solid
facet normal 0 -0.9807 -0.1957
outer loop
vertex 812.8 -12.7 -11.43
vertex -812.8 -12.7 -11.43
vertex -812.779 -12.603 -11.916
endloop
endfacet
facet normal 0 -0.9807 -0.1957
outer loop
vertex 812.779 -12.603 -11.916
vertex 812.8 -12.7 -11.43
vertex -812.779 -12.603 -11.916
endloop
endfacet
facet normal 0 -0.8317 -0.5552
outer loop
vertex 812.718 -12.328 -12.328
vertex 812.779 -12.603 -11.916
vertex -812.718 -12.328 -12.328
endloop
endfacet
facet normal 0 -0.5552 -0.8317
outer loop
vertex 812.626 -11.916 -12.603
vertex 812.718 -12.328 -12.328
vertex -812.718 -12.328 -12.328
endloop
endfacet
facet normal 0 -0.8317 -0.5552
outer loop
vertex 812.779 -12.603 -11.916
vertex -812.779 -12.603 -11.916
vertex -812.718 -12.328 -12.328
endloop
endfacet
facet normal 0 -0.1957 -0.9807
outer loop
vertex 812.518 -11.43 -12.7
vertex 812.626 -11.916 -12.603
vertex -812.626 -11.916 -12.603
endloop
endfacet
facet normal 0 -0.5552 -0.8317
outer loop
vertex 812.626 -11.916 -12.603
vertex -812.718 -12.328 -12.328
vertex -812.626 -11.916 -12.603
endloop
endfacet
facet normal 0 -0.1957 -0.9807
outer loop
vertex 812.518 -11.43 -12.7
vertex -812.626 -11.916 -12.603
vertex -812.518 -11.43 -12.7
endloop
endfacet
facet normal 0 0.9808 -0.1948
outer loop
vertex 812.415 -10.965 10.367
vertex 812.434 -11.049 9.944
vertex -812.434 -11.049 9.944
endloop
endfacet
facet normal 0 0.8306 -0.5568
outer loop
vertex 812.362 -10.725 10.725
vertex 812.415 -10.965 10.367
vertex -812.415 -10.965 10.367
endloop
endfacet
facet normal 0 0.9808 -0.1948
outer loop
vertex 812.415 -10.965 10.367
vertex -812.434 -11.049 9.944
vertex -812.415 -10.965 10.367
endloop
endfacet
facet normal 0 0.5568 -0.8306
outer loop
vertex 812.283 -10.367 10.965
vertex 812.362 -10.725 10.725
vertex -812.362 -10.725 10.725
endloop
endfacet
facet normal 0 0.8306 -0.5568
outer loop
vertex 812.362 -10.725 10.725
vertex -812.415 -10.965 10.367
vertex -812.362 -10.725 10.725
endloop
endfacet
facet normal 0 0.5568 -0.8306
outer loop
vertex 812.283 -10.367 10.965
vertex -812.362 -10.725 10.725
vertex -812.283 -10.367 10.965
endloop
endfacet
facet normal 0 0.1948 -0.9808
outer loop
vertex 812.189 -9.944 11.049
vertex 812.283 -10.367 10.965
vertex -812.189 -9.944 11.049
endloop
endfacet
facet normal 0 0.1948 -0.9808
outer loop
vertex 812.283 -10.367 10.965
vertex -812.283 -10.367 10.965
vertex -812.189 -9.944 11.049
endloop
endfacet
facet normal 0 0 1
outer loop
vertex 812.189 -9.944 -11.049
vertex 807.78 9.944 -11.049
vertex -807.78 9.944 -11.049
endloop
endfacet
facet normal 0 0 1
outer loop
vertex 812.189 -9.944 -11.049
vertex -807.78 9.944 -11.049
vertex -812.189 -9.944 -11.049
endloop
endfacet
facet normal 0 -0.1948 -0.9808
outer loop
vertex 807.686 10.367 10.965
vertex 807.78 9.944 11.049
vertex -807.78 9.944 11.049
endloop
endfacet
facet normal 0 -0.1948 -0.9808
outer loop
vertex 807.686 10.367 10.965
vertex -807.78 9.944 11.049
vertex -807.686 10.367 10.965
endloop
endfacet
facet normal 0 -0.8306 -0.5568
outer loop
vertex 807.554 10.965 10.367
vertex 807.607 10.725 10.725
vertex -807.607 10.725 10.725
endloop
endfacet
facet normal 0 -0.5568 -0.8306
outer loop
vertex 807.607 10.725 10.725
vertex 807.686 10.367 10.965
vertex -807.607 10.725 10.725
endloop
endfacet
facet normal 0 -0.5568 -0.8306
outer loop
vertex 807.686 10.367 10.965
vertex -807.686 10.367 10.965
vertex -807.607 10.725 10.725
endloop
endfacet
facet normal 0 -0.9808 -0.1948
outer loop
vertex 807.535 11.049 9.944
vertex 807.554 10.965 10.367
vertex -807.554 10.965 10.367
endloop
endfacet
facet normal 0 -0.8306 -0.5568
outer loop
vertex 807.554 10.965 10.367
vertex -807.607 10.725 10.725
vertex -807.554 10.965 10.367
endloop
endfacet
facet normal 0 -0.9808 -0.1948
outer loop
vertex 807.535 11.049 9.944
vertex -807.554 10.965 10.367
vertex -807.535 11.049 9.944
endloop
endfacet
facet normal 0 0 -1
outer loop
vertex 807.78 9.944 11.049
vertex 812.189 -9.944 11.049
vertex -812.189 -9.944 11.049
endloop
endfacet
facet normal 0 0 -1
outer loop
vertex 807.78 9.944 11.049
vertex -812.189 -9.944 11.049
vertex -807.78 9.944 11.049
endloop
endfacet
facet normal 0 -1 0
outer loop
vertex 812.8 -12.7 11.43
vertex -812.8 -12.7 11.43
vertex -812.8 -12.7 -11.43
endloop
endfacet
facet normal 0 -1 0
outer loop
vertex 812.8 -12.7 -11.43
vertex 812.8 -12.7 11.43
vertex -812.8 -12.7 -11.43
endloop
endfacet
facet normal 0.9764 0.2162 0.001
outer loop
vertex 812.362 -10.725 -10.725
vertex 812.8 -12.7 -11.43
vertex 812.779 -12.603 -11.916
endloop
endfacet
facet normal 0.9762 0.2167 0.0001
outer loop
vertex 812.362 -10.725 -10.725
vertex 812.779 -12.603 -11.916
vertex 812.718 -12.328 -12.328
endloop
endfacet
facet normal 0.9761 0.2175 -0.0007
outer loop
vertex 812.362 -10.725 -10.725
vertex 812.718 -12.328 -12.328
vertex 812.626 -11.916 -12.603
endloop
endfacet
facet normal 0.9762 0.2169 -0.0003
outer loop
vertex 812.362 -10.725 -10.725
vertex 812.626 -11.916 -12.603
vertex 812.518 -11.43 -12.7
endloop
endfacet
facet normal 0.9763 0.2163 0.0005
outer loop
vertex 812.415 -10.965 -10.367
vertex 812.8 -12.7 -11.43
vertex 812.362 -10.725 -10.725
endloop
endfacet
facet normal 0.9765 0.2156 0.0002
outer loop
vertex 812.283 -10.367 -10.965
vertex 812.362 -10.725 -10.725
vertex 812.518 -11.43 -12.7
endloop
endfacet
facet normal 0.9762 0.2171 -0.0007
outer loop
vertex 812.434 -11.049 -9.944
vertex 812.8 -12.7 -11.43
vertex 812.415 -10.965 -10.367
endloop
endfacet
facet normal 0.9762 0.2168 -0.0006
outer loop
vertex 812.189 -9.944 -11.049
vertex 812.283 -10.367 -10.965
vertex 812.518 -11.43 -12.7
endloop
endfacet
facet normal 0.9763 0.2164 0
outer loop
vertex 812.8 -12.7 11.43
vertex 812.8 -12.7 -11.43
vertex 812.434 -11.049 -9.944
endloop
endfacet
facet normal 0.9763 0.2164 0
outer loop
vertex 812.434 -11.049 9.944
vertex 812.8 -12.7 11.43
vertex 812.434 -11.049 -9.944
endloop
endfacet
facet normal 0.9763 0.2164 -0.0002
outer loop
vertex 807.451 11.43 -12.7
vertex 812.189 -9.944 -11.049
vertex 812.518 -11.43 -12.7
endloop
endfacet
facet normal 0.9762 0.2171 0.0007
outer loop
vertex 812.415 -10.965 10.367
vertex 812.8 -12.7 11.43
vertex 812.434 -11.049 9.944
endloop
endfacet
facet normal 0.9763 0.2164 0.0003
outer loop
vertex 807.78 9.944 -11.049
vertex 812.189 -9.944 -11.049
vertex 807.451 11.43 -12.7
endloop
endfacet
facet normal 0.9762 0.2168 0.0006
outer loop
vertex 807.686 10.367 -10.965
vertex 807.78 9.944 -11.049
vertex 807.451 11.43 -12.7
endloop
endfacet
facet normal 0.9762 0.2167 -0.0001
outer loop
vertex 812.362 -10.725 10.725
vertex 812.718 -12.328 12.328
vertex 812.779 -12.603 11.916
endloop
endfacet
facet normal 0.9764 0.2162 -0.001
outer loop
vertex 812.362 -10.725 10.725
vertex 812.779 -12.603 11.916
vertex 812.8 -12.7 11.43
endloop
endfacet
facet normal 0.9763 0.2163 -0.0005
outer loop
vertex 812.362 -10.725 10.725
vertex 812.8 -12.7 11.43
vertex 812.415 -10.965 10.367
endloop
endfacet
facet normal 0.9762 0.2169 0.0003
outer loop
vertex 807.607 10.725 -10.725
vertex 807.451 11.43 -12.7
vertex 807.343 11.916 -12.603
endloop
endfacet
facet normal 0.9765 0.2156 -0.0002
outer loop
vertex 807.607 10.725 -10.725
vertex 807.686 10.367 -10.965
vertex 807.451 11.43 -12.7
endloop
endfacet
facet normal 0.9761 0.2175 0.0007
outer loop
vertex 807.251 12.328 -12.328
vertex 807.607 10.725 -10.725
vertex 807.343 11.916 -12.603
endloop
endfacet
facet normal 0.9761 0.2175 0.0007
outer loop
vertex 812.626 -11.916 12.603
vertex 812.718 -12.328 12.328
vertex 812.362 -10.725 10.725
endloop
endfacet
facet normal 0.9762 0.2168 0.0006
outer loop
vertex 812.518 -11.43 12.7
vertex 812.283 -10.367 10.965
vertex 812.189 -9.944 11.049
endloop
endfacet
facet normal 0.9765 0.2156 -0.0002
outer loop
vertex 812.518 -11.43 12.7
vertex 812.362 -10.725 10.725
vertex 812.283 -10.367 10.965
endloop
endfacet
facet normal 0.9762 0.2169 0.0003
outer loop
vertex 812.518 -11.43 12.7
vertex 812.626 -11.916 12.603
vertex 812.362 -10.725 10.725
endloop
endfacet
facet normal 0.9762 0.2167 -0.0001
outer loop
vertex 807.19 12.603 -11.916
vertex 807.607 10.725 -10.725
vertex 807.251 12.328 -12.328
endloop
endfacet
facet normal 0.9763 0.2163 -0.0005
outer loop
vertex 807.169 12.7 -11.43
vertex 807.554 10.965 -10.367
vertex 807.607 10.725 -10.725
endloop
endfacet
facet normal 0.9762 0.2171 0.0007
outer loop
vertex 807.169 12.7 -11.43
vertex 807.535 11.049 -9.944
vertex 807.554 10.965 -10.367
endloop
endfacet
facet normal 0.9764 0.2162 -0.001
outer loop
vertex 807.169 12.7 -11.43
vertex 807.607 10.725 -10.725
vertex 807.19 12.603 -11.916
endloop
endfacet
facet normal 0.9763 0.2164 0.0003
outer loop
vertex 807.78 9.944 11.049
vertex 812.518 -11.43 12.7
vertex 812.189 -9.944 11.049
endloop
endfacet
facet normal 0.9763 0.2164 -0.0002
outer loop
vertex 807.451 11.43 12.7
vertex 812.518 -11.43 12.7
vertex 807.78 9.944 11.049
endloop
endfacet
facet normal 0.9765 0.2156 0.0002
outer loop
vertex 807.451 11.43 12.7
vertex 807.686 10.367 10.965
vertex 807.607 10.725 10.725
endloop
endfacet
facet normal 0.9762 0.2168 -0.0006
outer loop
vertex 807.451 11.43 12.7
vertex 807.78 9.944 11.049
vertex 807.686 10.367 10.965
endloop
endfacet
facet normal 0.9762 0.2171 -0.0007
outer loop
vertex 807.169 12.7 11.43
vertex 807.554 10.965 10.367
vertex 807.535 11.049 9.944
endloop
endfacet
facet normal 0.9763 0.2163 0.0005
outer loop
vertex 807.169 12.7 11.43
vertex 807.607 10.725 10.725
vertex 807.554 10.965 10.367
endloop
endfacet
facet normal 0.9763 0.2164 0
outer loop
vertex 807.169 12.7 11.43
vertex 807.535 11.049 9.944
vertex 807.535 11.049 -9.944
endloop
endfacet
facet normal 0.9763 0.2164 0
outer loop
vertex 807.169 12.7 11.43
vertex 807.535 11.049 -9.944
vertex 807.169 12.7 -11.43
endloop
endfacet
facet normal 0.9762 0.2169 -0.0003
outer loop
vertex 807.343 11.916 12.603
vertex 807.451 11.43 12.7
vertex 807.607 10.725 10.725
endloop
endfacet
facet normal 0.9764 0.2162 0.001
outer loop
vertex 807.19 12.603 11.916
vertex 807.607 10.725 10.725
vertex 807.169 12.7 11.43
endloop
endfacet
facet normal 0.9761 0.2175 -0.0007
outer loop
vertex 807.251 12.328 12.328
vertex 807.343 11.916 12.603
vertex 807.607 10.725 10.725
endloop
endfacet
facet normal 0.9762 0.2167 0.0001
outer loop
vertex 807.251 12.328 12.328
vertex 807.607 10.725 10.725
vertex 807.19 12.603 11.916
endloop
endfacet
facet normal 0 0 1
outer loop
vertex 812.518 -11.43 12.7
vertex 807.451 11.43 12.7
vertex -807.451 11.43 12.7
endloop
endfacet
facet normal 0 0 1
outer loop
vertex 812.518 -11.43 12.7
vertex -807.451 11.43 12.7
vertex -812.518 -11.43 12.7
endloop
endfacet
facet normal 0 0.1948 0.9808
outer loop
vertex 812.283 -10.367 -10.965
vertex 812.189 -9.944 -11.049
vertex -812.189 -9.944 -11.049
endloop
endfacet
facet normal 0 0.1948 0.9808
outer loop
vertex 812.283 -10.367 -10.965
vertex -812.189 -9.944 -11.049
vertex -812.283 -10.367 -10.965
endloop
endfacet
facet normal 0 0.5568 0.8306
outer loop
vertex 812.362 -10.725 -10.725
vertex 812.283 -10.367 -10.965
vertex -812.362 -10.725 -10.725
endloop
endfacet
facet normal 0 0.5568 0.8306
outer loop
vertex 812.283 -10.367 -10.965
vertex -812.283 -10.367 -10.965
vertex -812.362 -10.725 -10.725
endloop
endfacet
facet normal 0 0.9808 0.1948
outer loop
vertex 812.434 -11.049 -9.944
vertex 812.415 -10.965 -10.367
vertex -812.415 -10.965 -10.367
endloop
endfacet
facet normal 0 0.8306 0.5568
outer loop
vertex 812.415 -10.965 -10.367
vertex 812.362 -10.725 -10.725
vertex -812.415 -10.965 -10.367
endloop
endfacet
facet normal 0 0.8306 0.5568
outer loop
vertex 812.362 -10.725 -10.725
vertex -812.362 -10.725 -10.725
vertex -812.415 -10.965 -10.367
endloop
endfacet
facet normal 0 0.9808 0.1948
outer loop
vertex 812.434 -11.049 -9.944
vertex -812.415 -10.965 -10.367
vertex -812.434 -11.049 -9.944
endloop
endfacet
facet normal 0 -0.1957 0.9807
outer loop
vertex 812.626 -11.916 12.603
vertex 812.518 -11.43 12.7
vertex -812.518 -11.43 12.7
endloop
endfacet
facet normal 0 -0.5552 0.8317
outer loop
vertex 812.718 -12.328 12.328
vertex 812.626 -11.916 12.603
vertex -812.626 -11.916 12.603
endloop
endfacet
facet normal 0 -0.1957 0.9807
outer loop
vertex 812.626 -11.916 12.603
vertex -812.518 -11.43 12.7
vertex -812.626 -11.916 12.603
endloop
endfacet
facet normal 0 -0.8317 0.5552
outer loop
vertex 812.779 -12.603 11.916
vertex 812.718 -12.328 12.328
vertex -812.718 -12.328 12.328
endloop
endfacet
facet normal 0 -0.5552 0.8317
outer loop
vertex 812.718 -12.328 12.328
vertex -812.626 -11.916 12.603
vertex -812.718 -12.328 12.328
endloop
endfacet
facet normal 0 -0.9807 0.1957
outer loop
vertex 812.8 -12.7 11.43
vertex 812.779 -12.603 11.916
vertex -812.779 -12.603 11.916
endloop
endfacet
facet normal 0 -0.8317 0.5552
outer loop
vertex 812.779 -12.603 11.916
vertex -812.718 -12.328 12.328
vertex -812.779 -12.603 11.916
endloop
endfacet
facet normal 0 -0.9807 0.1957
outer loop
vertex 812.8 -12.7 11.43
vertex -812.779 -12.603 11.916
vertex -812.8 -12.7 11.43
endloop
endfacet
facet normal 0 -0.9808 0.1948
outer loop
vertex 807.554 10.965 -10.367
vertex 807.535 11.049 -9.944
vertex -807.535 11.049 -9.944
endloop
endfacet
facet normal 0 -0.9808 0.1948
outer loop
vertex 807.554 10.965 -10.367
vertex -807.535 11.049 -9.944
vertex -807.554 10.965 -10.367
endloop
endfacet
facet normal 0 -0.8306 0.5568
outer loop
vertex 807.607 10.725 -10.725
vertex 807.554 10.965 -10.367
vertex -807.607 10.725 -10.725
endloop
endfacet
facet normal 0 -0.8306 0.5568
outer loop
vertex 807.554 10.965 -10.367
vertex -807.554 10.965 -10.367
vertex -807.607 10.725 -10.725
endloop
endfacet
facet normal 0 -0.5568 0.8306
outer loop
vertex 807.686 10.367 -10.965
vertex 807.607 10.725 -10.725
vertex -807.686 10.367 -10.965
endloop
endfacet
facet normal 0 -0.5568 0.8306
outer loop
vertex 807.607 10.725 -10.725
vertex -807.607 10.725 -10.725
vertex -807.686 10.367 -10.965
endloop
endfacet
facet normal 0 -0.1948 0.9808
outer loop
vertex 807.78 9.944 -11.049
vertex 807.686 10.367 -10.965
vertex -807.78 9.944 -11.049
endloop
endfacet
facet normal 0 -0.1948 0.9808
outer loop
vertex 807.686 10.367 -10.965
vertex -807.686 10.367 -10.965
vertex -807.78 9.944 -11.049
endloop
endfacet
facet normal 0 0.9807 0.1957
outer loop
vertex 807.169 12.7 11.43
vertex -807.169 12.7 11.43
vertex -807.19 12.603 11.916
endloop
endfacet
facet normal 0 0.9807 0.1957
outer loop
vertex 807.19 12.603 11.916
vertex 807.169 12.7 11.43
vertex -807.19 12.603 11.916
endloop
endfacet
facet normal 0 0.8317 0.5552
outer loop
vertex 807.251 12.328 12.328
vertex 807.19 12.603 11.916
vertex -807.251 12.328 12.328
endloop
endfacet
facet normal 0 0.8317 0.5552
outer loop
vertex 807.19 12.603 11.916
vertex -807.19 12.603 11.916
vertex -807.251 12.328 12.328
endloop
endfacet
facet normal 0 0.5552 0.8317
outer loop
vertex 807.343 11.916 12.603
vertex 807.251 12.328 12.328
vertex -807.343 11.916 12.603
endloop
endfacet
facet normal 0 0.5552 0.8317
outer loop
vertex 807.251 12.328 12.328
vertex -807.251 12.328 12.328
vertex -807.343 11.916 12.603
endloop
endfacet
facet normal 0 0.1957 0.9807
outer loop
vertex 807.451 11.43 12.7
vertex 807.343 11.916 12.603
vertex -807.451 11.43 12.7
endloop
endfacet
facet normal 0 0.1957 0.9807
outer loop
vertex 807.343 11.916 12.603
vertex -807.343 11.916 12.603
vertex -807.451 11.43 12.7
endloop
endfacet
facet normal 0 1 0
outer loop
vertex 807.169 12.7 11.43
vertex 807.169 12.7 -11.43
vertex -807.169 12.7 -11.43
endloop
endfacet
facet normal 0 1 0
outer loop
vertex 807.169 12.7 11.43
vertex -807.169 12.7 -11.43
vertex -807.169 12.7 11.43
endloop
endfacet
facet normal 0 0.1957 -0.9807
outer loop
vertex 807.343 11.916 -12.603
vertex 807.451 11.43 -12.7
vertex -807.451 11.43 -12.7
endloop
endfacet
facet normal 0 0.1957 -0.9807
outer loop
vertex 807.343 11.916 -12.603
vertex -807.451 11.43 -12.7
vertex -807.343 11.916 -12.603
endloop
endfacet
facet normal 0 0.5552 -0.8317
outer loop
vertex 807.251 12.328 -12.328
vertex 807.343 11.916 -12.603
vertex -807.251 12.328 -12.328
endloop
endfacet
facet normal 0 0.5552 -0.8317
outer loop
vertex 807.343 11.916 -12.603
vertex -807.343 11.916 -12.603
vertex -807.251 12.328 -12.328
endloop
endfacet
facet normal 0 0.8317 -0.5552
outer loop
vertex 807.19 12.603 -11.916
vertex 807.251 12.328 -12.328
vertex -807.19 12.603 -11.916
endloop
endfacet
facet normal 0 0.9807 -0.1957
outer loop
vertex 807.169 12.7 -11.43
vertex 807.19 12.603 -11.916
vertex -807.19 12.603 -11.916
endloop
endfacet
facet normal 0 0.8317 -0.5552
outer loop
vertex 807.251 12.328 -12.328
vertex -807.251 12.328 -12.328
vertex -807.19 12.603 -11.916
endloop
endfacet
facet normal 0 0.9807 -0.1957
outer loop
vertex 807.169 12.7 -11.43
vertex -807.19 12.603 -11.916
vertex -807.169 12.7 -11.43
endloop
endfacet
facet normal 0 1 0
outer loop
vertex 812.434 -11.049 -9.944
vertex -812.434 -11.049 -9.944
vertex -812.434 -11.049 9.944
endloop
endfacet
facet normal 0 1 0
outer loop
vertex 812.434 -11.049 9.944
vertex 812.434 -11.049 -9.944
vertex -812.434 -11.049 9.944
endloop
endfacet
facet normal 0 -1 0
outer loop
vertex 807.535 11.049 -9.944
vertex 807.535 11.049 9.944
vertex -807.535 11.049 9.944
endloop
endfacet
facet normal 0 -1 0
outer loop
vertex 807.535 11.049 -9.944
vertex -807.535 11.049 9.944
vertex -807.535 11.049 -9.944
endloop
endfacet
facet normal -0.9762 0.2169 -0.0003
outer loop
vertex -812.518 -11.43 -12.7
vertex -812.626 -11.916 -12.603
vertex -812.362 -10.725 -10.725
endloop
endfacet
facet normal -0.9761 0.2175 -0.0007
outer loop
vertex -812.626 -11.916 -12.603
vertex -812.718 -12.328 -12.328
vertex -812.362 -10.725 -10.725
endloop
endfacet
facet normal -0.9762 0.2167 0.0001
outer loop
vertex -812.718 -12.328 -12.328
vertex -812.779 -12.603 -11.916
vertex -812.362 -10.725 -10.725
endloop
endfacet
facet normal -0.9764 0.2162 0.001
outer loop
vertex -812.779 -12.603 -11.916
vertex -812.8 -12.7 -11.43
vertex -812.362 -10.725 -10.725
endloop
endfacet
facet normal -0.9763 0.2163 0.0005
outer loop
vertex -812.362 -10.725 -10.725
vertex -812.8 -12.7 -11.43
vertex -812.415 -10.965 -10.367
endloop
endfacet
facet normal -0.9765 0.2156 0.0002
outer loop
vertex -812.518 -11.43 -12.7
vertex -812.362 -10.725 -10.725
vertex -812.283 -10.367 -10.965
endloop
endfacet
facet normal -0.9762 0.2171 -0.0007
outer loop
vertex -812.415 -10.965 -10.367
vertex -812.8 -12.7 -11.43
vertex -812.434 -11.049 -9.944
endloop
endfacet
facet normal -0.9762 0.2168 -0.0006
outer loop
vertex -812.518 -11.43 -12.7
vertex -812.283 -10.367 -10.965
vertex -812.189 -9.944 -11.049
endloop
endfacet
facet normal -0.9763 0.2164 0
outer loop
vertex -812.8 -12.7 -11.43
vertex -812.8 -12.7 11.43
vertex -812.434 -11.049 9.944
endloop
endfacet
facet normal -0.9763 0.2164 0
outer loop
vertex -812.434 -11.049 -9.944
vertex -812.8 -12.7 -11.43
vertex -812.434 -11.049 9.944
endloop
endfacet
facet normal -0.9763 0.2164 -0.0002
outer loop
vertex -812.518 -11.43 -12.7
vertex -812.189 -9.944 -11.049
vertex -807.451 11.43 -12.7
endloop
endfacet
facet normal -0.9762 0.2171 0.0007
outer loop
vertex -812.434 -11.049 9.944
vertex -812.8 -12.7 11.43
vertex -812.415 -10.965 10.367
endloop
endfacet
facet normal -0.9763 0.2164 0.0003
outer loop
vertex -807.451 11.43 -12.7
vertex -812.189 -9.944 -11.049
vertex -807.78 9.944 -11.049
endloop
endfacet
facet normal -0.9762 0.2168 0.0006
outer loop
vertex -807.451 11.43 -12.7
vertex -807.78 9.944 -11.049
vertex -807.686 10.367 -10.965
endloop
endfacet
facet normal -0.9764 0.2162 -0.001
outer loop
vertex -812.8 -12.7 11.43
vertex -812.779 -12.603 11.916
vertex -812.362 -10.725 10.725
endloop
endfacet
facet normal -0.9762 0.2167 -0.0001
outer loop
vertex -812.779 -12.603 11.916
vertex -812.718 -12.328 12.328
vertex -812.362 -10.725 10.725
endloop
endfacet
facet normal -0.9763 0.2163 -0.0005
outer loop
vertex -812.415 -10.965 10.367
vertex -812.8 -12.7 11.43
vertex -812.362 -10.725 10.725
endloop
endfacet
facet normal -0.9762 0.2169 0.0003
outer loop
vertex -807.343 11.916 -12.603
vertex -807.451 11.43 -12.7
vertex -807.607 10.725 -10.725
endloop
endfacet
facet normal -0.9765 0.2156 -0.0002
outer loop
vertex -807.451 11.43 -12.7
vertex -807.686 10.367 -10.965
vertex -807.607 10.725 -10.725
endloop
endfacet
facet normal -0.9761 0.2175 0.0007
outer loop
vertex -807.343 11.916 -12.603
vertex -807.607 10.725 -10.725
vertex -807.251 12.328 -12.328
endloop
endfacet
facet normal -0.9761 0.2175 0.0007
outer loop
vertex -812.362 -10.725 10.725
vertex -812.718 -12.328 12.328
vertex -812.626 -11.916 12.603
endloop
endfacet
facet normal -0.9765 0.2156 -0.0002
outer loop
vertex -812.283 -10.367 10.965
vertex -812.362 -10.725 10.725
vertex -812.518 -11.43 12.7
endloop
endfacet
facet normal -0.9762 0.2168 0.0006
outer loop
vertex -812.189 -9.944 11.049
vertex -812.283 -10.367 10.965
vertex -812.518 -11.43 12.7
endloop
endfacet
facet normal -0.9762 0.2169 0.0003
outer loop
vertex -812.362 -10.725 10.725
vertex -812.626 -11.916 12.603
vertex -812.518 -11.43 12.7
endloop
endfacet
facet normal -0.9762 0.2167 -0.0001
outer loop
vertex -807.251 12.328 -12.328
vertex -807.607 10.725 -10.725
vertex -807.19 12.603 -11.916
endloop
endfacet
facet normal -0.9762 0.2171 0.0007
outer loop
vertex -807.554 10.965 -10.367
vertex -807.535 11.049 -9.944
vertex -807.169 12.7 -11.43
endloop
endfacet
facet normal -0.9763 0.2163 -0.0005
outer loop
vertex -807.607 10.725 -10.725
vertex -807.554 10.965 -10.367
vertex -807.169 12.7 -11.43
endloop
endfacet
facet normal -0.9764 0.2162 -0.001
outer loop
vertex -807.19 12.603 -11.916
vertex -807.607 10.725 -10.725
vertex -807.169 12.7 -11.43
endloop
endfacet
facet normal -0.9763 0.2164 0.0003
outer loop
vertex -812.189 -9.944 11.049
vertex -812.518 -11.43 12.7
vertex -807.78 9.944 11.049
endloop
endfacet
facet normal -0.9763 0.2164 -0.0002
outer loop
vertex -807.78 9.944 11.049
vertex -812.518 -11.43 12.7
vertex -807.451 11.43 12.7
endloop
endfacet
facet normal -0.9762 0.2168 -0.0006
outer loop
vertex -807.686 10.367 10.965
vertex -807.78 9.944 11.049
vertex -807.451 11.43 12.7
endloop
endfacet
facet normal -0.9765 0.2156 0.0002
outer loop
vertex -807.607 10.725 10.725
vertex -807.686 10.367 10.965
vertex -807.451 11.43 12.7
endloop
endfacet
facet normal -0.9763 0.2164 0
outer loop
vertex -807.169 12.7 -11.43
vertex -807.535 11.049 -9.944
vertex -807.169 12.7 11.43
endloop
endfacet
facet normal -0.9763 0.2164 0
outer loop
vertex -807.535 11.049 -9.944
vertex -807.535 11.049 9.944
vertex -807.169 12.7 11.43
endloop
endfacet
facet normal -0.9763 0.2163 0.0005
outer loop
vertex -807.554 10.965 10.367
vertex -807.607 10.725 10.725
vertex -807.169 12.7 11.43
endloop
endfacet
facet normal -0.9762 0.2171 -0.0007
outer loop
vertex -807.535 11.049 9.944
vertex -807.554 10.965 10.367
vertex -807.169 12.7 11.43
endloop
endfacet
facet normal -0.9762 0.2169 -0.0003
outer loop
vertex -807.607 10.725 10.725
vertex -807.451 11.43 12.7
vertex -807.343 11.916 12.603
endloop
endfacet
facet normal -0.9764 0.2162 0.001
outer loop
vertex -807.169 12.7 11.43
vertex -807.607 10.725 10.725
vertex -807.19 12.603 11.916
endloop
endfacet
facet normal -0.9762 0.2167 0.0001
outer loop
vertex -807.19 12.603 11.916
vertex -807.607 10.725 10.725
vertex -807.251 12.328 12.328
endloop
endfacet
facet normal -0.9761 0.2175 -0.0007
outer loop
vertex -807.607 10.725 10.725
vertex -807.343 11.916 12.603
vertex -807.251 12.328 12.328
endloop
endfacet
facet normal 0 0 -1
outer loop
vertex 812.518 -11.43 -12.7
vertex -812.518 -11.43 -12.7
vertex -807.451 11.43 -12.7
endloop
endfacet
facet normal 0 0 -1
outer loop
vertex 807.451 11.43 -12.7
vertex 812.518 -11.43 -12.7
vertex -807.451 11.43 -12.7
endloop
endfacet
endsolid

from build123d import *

# Parameters (mm, degrees)
BOSS_EXTRUDE1_DEPTH      = 812.8
BOSS_EXTRUDE1_DEPTH_BACK = 812.8
CUT_EXTRUDE1_DEPTH       = 814.295942447


with BuildPart() as part:
    # Sketch4 → Boss-Extrude1 (new, two sides: drawn at the far end of the back side and taken through both)
    with BuildSketch(Plane(origin=(0, 0, 0), x_dir=(0, 0, -1), z_dir=(1, 0, 0)).offset(-BOSS_EXTRUDE1_DEPTH_BACK)):
        with BuildLine():
            Line((12.7, -11.43), (12.7, 11.43))
            ThreePointArc((12.7, 11.43), (12.328025612, 12.328025612), (11.43, 12.7))
            Line((11.43, 12.7), (-11.43, 12.7))
            ThreePointArc((-11.43, 12.7), (-12.328025612, 12.328025612), (-12.7, 11.43))
            Line((-12.7, 11.43), (-12.7, -11.43))
            ThreePointArc((-12.7, -11.43), (-12.328025612, -12.328025612), (-11.43, -12.7))
            Line((-11.43, -12.7), (11.43, -12.7))
            ThreePointArc((11.43, -12.7), (12.328025612, -12.328025612), (12.7, -11.43))
        make_face()
        with BuildLine():
            Line((11.049, 9.9441), (11.049, -9.9441))
            ThreePointArc((11.049, -9.9441), (10.725382283, -10.725382283), (9.9441, -11.049))
            Line((9.9441, -11.049), (-9.9441, -11.049))
            ThreePointArc((-9.9441, -11.049), (-10.725382283, -10.725382283), (-11.049, -9.9441))
            Line((-11.049, -9.9441), (-11.049, 9.9441))
            ThreePointArc((-11.049, 9.9441), (-10.725382283, 10.725382283), (-9.9441, 11.049))
            Line((-9.9441, 11.049), (9.9441, 11.049))
            ThreePointArc((9.9441, 11.049), (10.725382283, 10.725382283), (11.049, 9.9441))
        make_face(mode=Mode.SUBTRACT)
    extrude(amount=BOSS_EXTRUDE1_DEPTH + BOSS_EXTRUDE1_DEPTH_BACK)

    # Sketch5 → Cut-Extrude1 (cut, through all)
    with BuildSketch(Plane.XY.offset(12.7)):
        Polygon((812.8, -12.7), (807.168955569, 12.7), (812.8, 12.7), align=None)
    cut_extrude1 = extrude(amount=-CUT_EXTRUDE1_DEPTH, mode=Mode.SUBTRACT)

    # Mirror1: Cut-Extrude1 across plane
    add(cut_extrude1.mirror(Plane(origin=(0, 0, 0), x_dir=(0, 0, 1), z_dir=(1, 0, 0))), mode=Mode.SUBTRACT)


solid = part.part
